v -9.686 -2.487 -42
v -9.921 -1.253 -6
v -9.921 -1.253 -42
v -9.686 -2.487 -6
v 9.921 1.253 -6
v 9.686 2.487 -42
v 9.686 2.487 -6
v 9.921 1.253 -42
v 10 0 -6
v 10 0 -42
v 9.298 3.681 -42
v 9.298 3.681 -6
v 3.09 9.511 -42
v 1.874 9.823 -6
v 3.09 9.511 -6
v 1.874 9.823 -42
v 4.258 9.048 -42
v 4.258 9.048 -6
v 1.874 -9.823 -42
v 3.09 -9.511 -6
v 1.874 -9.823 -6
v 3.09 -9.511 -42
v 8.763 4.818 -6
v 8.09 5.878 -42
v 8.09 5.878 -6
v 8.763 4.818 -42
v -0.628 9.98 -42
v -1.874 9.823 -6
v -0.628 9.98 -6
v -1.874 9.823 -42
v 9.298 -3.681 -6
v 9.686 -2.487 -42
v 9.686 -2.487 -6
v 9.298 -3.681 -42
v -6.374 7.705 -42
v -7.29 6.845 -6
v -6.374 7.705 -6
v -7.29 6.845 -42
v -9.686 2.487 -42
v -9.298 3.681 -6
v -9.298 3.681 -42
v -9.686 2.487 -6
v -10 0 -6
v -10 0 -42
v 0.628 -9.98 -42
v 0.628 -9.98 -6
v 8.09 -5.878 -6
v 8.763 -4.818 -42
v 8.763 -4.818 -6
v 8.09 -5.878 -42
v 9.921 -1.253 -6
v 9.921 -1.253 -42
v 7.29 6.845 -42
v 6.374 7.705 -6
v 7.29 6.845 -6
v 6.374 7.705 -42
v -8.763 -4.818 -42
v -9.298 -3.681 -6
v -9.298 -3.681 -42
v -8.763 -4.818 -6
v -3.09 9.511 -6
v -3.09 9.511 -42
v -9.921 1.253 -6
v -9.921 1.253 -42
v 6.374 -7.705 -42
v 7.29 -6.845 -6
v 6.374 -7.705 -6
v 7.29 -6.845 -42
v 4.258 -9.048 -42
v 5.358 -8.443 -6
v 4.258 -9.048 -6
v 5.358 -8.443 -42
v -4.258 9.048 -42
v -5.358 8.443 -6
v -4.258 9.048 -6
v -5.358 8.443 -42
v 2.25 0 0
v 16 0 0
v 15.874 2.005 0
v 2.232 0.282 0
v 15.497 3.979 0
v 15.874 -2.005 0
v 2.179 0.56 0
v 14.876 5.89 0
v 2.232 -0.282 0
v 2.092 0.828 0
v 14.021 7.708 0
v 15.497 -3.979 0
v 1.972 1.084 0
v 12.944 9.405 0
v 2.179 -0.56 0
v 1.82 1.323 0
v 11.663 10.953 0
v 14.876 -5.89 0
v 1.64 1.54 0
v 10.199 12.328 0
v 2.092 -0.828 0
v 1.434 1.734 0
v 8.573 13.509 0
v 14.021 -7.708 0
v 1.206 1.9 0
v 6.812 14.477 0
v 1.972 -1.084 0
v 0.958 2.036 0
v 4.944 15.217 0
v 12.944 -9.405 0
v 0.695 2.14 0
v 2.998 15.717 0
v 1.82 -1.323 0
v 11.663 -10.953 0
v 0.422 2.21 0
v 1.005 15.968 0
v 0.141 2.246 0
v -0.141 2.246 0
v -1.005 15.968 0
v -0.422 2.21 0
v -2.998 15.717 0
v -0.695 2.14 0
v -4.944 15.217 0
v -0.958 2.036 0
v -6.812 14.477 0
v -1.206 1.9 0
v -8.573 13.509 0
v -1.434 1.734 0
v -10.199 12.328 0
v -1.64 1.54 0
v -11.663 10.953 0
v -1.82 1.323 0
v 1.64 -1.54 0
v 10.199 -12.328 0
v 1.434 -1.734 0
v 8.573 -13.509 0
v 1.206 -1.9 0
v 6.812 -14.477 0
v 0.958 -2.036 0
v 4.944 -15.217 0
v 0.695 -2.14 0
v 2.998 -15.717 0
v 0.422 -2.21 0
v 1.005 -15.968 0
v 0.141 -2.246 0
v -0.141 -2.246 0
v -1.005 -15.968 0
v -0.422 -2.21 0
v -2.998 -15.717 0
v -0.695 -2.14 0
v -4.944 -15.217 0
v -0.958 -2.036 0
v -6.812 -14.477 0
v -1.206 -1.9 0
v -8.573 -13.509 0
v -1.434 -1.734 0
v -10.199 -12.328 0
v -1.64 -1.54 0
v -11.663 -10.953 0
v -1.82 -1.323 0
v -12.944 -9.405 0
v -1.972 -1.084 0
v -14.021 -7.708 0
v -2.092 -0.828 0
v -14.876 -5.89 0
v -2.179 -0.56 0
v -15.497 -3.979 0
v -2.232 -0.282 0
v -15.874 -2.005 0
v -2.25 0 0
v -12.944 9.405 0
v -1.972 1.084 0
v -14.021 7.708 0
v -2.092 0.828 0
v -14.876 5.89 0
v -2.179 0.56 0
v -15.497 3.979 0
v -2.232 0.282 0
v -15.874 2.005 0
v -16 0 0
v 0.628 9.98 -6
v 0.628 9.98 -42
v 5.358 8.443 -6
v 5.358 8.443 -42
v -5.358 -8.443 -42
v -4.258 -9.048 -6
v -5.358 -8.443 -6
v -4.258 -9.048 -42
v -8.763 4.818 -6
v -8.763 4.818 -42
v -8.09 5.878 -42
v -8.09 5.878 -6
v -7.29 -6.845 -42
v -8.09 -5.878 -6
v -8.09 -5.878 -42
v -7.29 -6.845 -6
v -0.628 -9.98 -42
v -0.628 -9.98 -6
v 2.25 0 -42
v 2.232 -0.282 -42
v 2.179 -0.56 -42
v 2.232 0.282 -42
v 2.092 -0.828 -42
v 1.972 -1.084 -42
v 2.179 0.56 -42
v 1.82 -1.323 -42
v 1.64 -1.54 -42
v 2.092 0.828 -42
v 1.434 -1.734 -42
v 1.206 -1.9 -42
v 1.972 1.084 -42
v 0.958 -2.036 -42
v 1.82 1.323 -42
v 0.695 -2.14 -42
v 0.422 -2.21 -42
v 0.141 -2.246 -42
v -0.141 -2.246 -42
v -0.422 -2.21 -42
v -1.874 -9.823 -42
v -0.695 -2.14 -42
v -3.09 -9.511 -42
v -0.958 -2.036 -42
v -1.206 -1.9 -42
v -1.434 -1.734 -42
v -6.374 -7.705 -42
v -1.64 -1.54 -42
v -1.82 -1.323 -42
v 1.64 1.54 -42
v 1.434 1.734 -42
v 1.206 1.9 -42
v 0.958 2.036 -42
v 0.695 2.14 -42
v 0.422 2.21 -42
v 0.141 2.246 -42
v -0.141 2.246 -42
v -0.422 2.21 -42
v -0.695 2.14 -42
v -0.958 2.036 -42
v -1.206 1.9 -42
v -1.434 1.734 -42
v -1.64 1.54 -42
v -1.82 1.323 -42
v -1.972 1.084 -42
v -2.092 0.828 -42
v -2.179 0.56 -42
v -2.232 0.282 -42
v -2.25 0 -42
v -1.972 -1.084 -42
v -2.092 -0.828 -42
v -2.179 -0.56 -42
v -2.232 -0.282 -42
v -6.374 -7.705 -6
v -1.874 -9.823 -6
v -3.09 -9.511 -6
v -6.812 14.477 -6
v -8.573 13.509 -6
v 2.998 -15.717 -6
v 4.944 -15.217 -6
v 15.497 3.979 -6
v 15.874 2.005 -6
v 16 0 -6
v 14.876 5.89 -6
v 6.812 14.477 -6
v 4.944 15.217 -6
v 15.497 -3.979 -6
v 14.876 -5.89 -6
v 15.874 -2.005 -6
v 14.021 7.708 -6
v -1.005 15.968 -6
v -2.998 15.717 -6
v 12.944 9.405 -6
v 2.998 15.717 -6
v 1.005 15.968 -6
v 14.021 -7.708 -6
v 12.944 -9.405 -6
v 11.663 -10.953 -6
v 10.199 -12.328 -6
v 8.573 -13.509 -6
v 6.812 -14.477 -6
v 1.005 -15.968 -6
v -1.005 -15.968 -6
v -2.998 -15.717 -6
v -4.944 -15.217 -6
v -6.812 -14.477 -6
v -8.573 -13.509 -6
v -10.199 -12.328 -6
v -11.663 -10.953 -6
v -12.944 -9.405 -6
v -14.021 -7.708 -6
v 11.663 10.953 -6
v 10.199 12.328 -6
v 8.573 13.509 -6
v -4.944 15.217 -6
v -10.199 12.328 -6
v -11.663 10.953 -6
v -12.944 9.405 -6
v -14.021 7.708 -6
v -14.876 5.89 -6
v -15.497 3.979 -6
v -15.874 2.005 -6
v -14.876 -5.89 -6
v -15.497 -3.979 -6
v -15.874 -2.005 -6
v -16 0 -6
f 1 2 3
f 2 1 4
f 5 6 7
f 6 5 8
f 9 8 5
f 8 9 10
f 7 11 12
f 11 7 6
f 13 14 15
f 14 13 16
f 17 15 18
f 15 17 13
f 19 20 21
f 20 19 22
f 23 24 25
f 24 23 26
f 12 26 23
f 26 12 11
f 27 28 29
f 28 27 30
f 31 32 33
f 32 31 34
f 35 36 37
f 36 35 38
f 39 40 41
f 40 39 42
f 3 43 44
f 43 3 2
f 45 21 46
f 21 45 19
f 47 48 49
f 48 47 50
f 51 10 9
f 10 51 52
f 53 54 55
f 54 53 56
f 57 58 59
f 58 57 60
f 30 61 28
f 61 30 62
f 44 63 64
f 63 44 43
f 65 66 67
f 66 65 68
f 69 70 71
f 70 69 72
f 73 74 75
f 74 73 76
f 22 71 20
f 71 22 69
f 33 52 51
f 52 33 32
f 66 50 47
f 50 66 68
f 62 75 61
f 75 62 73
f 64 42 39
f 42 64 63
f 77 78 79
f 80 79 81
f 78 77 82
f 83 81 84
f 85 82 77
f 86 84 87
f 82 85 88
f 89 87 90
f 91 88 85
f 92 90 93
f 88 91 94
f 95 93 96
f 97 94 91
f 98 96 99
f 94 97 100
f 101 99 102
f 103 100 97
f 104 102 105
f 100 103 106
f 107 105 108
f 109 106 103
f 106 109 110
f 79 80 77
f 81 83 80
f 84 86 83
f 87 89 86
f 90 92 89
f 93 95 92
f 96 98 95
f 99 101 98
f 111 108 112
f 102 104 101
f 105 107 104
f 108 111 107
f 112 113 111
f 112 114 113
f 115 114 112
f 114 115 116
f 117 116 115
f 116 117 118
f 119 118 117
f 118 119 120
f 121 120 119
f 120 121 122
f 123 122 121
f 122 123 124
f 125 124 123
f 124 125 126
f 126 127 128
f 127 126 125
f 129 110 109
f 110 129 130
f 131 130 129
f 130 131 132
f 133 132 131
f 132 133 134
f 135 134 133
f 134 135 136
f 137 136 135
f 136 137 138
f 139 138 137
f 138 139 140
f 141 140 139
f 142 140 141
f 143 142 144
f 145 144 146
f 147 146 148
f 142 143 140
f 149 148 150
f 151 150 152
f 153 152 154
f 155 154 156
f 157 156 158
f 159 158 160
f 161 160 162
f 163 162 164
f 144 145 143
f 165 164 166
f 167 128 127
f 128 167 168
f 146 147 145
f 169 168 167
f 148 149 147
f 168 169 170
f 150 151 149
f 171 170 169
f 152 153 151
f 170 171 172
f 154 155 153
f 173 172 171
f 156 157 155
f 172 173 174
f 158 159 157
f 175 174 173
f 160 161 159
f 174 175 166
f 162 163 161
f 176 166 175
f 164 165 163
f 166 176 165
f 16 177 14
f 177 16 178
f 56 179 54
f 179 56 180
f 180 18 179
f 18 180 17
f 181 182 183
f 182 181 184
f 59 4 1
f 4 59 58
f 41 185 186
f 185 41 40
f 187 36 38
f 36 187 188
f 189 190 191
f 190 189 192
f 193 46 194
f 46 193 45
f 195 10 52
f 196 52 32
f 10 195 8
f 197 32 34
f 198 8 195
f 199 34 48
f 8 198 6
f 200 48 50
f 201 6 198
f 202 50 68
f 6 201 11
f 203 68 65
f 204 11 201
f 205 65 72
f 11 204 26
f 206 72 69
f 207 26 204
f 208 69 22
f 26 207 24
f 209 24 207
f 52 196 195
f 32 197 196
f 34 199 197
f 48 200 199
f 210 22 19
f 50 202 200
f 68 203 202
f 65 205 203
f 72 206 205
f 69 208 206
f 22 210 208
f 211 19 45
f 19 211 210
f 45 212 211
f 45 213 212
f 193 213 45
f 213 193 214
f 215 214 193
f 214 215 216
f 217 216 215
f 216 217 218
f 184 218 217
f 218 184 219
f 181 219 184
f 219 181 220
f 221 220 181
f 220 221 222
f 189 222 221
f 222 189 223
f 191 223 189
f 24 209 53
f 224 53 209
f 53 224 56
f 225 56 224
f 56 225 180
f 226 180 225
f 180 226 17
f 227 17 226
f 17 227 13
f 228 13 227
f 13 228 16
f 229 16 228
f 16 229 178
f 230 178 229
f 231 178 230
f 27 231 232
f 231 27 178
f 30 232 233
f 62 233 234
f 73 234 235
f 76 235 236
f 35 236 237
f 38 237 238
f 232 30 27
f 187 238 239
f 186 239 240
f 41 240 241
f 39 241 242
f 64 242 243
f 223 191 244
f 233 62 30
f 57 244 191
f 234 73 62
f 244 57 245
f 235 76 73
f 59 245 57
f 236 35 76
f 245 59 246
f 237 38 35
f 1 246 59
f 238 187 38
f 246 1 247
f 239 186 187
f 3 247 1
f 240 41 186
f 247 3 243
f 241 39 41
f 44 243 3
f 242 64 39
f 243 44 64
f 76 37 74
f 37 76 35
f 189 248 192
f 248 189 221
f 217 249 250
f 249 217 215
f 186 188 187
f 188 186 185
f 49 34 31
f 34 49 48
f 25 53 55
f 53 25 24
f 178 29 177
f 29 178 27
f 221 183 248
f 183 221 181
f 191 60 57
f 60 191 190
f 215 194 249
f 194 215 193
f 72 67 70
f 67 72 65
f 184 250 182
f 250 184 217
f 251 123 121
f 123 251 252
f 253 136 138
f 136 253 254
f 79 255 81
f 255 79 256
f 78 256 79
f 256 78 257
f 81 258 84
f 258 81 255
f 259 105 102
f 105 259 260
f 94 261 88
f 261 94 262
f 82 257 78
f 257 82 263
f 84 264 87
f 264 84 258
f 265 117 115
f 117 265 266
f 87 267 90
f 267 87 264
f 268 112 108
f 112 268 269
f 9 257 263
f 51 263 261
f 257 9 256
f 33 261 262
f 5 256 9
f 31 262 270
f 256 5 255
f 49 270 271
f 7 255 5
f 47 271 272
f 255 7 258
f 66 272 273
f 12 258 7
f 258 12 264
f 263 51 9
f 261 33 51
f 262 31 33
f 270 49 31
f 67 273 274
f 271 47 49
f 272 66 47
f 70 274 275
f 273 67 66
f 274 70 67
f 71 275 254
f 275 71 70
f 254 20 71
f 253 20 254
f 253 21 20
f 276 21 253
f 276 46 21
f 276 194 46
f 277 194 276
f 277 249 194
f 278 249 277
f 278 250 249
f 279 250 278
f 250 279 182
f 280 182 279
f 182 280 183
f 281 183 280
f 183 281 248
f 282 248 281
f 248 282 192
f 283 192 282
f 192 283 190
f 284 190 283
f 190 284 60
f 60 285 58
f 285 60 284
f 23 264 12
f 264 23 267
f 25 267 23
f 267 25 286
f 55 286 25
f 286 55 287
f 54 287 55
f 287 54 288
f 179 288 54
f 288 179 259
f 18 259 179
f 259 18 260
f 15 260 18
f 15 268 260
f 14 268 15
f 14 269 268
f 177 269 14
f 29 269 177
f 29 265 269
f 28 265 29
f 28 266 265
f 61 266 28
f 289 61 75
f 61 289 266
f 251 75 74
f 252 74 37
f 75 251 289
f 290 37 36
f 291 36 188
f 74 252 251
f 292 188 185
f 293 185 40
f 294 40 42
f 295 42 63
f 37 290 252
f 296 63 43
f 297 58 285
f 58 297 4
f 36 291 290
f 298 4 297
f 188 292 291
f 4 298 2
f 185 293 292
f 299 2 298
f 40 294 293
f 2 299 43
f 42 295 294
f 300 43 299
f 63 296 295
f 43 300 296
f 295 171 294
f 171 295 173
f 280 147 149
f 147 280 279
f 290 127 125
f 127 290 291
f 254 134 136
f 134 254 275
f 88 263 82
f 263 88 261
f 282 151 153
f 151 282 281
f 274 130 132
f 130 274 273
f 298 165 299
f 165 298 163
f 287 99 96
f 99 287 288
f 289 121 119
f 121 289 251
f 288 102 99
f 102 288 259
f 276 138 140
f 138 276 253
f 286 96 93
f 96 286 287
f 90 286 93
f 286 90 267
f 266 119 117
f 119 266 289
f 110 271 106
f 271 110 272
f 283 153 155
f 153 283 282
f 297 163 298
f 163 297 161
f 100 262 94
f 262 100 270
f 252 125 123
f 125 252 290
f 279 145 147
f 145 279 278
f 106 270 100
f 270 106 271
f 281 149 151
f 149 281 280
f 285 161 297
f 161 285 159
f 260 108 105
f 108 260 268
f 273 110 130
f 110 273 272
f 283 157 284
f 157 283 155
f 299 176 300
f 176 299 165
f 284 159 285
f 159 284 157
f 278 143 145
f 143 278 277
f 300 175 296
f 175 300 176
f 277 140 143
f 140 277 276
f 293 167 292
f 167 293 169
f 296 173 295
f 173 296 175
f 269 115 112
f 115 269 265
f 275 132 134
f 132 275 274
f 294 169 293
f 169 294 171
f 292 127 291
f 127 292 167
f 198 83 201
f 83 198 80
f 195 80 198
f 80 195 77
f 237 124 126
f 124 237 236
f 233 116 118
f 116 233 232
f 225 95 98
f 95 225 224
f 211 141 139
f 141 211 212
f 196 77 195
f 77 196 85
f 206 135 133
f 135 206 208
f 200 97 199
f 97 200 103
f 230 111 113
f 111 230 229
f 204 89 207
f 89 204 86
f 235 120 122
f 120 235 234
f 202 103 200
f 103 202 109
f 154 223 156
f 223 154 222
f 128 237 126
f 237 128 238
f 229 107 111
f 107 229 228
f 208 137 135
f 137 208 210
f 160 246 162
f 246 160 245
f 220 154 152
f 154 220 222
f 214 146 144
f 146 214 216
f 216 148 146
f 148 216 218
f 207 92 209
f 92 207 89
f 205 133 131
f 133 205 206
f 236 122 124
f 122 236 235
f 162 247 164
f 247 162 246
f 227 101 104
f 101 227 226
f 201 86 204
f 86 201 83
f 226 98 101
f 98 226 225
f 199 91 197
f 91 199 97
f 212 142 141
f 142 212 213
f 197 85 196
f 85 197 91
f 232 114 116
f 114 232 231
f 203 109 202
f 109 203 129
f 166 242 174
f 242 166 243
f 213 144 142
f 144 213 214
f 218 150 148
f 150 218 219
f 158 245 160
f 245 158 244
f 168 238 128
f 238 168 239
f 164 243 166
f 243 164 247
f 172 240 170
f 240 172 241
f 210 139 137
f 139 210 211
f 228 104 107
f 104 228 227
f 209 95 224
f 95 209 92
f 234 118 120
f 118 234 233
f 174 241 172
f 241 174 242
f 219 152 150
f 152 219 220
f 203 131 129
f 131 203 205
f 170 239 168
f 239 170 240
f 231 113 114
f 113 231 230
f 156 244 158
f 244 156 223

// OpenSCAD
$fn = 50;


difference() {
	union() {
		translate(v = [0, 0, -42.0000000000]) {
			cylinder(h = 42, r = 10.0000000000);
		}
		translate(v = [0, 0, -6.0000000000]) {
			cylinder(h = 6, r = 16.0000000000);
		}
	}
	union() {
		#translate(v = [0, 0, -42]) {
			cylinder(h = 42, r = 2.2500000000);
		}
	}
}
